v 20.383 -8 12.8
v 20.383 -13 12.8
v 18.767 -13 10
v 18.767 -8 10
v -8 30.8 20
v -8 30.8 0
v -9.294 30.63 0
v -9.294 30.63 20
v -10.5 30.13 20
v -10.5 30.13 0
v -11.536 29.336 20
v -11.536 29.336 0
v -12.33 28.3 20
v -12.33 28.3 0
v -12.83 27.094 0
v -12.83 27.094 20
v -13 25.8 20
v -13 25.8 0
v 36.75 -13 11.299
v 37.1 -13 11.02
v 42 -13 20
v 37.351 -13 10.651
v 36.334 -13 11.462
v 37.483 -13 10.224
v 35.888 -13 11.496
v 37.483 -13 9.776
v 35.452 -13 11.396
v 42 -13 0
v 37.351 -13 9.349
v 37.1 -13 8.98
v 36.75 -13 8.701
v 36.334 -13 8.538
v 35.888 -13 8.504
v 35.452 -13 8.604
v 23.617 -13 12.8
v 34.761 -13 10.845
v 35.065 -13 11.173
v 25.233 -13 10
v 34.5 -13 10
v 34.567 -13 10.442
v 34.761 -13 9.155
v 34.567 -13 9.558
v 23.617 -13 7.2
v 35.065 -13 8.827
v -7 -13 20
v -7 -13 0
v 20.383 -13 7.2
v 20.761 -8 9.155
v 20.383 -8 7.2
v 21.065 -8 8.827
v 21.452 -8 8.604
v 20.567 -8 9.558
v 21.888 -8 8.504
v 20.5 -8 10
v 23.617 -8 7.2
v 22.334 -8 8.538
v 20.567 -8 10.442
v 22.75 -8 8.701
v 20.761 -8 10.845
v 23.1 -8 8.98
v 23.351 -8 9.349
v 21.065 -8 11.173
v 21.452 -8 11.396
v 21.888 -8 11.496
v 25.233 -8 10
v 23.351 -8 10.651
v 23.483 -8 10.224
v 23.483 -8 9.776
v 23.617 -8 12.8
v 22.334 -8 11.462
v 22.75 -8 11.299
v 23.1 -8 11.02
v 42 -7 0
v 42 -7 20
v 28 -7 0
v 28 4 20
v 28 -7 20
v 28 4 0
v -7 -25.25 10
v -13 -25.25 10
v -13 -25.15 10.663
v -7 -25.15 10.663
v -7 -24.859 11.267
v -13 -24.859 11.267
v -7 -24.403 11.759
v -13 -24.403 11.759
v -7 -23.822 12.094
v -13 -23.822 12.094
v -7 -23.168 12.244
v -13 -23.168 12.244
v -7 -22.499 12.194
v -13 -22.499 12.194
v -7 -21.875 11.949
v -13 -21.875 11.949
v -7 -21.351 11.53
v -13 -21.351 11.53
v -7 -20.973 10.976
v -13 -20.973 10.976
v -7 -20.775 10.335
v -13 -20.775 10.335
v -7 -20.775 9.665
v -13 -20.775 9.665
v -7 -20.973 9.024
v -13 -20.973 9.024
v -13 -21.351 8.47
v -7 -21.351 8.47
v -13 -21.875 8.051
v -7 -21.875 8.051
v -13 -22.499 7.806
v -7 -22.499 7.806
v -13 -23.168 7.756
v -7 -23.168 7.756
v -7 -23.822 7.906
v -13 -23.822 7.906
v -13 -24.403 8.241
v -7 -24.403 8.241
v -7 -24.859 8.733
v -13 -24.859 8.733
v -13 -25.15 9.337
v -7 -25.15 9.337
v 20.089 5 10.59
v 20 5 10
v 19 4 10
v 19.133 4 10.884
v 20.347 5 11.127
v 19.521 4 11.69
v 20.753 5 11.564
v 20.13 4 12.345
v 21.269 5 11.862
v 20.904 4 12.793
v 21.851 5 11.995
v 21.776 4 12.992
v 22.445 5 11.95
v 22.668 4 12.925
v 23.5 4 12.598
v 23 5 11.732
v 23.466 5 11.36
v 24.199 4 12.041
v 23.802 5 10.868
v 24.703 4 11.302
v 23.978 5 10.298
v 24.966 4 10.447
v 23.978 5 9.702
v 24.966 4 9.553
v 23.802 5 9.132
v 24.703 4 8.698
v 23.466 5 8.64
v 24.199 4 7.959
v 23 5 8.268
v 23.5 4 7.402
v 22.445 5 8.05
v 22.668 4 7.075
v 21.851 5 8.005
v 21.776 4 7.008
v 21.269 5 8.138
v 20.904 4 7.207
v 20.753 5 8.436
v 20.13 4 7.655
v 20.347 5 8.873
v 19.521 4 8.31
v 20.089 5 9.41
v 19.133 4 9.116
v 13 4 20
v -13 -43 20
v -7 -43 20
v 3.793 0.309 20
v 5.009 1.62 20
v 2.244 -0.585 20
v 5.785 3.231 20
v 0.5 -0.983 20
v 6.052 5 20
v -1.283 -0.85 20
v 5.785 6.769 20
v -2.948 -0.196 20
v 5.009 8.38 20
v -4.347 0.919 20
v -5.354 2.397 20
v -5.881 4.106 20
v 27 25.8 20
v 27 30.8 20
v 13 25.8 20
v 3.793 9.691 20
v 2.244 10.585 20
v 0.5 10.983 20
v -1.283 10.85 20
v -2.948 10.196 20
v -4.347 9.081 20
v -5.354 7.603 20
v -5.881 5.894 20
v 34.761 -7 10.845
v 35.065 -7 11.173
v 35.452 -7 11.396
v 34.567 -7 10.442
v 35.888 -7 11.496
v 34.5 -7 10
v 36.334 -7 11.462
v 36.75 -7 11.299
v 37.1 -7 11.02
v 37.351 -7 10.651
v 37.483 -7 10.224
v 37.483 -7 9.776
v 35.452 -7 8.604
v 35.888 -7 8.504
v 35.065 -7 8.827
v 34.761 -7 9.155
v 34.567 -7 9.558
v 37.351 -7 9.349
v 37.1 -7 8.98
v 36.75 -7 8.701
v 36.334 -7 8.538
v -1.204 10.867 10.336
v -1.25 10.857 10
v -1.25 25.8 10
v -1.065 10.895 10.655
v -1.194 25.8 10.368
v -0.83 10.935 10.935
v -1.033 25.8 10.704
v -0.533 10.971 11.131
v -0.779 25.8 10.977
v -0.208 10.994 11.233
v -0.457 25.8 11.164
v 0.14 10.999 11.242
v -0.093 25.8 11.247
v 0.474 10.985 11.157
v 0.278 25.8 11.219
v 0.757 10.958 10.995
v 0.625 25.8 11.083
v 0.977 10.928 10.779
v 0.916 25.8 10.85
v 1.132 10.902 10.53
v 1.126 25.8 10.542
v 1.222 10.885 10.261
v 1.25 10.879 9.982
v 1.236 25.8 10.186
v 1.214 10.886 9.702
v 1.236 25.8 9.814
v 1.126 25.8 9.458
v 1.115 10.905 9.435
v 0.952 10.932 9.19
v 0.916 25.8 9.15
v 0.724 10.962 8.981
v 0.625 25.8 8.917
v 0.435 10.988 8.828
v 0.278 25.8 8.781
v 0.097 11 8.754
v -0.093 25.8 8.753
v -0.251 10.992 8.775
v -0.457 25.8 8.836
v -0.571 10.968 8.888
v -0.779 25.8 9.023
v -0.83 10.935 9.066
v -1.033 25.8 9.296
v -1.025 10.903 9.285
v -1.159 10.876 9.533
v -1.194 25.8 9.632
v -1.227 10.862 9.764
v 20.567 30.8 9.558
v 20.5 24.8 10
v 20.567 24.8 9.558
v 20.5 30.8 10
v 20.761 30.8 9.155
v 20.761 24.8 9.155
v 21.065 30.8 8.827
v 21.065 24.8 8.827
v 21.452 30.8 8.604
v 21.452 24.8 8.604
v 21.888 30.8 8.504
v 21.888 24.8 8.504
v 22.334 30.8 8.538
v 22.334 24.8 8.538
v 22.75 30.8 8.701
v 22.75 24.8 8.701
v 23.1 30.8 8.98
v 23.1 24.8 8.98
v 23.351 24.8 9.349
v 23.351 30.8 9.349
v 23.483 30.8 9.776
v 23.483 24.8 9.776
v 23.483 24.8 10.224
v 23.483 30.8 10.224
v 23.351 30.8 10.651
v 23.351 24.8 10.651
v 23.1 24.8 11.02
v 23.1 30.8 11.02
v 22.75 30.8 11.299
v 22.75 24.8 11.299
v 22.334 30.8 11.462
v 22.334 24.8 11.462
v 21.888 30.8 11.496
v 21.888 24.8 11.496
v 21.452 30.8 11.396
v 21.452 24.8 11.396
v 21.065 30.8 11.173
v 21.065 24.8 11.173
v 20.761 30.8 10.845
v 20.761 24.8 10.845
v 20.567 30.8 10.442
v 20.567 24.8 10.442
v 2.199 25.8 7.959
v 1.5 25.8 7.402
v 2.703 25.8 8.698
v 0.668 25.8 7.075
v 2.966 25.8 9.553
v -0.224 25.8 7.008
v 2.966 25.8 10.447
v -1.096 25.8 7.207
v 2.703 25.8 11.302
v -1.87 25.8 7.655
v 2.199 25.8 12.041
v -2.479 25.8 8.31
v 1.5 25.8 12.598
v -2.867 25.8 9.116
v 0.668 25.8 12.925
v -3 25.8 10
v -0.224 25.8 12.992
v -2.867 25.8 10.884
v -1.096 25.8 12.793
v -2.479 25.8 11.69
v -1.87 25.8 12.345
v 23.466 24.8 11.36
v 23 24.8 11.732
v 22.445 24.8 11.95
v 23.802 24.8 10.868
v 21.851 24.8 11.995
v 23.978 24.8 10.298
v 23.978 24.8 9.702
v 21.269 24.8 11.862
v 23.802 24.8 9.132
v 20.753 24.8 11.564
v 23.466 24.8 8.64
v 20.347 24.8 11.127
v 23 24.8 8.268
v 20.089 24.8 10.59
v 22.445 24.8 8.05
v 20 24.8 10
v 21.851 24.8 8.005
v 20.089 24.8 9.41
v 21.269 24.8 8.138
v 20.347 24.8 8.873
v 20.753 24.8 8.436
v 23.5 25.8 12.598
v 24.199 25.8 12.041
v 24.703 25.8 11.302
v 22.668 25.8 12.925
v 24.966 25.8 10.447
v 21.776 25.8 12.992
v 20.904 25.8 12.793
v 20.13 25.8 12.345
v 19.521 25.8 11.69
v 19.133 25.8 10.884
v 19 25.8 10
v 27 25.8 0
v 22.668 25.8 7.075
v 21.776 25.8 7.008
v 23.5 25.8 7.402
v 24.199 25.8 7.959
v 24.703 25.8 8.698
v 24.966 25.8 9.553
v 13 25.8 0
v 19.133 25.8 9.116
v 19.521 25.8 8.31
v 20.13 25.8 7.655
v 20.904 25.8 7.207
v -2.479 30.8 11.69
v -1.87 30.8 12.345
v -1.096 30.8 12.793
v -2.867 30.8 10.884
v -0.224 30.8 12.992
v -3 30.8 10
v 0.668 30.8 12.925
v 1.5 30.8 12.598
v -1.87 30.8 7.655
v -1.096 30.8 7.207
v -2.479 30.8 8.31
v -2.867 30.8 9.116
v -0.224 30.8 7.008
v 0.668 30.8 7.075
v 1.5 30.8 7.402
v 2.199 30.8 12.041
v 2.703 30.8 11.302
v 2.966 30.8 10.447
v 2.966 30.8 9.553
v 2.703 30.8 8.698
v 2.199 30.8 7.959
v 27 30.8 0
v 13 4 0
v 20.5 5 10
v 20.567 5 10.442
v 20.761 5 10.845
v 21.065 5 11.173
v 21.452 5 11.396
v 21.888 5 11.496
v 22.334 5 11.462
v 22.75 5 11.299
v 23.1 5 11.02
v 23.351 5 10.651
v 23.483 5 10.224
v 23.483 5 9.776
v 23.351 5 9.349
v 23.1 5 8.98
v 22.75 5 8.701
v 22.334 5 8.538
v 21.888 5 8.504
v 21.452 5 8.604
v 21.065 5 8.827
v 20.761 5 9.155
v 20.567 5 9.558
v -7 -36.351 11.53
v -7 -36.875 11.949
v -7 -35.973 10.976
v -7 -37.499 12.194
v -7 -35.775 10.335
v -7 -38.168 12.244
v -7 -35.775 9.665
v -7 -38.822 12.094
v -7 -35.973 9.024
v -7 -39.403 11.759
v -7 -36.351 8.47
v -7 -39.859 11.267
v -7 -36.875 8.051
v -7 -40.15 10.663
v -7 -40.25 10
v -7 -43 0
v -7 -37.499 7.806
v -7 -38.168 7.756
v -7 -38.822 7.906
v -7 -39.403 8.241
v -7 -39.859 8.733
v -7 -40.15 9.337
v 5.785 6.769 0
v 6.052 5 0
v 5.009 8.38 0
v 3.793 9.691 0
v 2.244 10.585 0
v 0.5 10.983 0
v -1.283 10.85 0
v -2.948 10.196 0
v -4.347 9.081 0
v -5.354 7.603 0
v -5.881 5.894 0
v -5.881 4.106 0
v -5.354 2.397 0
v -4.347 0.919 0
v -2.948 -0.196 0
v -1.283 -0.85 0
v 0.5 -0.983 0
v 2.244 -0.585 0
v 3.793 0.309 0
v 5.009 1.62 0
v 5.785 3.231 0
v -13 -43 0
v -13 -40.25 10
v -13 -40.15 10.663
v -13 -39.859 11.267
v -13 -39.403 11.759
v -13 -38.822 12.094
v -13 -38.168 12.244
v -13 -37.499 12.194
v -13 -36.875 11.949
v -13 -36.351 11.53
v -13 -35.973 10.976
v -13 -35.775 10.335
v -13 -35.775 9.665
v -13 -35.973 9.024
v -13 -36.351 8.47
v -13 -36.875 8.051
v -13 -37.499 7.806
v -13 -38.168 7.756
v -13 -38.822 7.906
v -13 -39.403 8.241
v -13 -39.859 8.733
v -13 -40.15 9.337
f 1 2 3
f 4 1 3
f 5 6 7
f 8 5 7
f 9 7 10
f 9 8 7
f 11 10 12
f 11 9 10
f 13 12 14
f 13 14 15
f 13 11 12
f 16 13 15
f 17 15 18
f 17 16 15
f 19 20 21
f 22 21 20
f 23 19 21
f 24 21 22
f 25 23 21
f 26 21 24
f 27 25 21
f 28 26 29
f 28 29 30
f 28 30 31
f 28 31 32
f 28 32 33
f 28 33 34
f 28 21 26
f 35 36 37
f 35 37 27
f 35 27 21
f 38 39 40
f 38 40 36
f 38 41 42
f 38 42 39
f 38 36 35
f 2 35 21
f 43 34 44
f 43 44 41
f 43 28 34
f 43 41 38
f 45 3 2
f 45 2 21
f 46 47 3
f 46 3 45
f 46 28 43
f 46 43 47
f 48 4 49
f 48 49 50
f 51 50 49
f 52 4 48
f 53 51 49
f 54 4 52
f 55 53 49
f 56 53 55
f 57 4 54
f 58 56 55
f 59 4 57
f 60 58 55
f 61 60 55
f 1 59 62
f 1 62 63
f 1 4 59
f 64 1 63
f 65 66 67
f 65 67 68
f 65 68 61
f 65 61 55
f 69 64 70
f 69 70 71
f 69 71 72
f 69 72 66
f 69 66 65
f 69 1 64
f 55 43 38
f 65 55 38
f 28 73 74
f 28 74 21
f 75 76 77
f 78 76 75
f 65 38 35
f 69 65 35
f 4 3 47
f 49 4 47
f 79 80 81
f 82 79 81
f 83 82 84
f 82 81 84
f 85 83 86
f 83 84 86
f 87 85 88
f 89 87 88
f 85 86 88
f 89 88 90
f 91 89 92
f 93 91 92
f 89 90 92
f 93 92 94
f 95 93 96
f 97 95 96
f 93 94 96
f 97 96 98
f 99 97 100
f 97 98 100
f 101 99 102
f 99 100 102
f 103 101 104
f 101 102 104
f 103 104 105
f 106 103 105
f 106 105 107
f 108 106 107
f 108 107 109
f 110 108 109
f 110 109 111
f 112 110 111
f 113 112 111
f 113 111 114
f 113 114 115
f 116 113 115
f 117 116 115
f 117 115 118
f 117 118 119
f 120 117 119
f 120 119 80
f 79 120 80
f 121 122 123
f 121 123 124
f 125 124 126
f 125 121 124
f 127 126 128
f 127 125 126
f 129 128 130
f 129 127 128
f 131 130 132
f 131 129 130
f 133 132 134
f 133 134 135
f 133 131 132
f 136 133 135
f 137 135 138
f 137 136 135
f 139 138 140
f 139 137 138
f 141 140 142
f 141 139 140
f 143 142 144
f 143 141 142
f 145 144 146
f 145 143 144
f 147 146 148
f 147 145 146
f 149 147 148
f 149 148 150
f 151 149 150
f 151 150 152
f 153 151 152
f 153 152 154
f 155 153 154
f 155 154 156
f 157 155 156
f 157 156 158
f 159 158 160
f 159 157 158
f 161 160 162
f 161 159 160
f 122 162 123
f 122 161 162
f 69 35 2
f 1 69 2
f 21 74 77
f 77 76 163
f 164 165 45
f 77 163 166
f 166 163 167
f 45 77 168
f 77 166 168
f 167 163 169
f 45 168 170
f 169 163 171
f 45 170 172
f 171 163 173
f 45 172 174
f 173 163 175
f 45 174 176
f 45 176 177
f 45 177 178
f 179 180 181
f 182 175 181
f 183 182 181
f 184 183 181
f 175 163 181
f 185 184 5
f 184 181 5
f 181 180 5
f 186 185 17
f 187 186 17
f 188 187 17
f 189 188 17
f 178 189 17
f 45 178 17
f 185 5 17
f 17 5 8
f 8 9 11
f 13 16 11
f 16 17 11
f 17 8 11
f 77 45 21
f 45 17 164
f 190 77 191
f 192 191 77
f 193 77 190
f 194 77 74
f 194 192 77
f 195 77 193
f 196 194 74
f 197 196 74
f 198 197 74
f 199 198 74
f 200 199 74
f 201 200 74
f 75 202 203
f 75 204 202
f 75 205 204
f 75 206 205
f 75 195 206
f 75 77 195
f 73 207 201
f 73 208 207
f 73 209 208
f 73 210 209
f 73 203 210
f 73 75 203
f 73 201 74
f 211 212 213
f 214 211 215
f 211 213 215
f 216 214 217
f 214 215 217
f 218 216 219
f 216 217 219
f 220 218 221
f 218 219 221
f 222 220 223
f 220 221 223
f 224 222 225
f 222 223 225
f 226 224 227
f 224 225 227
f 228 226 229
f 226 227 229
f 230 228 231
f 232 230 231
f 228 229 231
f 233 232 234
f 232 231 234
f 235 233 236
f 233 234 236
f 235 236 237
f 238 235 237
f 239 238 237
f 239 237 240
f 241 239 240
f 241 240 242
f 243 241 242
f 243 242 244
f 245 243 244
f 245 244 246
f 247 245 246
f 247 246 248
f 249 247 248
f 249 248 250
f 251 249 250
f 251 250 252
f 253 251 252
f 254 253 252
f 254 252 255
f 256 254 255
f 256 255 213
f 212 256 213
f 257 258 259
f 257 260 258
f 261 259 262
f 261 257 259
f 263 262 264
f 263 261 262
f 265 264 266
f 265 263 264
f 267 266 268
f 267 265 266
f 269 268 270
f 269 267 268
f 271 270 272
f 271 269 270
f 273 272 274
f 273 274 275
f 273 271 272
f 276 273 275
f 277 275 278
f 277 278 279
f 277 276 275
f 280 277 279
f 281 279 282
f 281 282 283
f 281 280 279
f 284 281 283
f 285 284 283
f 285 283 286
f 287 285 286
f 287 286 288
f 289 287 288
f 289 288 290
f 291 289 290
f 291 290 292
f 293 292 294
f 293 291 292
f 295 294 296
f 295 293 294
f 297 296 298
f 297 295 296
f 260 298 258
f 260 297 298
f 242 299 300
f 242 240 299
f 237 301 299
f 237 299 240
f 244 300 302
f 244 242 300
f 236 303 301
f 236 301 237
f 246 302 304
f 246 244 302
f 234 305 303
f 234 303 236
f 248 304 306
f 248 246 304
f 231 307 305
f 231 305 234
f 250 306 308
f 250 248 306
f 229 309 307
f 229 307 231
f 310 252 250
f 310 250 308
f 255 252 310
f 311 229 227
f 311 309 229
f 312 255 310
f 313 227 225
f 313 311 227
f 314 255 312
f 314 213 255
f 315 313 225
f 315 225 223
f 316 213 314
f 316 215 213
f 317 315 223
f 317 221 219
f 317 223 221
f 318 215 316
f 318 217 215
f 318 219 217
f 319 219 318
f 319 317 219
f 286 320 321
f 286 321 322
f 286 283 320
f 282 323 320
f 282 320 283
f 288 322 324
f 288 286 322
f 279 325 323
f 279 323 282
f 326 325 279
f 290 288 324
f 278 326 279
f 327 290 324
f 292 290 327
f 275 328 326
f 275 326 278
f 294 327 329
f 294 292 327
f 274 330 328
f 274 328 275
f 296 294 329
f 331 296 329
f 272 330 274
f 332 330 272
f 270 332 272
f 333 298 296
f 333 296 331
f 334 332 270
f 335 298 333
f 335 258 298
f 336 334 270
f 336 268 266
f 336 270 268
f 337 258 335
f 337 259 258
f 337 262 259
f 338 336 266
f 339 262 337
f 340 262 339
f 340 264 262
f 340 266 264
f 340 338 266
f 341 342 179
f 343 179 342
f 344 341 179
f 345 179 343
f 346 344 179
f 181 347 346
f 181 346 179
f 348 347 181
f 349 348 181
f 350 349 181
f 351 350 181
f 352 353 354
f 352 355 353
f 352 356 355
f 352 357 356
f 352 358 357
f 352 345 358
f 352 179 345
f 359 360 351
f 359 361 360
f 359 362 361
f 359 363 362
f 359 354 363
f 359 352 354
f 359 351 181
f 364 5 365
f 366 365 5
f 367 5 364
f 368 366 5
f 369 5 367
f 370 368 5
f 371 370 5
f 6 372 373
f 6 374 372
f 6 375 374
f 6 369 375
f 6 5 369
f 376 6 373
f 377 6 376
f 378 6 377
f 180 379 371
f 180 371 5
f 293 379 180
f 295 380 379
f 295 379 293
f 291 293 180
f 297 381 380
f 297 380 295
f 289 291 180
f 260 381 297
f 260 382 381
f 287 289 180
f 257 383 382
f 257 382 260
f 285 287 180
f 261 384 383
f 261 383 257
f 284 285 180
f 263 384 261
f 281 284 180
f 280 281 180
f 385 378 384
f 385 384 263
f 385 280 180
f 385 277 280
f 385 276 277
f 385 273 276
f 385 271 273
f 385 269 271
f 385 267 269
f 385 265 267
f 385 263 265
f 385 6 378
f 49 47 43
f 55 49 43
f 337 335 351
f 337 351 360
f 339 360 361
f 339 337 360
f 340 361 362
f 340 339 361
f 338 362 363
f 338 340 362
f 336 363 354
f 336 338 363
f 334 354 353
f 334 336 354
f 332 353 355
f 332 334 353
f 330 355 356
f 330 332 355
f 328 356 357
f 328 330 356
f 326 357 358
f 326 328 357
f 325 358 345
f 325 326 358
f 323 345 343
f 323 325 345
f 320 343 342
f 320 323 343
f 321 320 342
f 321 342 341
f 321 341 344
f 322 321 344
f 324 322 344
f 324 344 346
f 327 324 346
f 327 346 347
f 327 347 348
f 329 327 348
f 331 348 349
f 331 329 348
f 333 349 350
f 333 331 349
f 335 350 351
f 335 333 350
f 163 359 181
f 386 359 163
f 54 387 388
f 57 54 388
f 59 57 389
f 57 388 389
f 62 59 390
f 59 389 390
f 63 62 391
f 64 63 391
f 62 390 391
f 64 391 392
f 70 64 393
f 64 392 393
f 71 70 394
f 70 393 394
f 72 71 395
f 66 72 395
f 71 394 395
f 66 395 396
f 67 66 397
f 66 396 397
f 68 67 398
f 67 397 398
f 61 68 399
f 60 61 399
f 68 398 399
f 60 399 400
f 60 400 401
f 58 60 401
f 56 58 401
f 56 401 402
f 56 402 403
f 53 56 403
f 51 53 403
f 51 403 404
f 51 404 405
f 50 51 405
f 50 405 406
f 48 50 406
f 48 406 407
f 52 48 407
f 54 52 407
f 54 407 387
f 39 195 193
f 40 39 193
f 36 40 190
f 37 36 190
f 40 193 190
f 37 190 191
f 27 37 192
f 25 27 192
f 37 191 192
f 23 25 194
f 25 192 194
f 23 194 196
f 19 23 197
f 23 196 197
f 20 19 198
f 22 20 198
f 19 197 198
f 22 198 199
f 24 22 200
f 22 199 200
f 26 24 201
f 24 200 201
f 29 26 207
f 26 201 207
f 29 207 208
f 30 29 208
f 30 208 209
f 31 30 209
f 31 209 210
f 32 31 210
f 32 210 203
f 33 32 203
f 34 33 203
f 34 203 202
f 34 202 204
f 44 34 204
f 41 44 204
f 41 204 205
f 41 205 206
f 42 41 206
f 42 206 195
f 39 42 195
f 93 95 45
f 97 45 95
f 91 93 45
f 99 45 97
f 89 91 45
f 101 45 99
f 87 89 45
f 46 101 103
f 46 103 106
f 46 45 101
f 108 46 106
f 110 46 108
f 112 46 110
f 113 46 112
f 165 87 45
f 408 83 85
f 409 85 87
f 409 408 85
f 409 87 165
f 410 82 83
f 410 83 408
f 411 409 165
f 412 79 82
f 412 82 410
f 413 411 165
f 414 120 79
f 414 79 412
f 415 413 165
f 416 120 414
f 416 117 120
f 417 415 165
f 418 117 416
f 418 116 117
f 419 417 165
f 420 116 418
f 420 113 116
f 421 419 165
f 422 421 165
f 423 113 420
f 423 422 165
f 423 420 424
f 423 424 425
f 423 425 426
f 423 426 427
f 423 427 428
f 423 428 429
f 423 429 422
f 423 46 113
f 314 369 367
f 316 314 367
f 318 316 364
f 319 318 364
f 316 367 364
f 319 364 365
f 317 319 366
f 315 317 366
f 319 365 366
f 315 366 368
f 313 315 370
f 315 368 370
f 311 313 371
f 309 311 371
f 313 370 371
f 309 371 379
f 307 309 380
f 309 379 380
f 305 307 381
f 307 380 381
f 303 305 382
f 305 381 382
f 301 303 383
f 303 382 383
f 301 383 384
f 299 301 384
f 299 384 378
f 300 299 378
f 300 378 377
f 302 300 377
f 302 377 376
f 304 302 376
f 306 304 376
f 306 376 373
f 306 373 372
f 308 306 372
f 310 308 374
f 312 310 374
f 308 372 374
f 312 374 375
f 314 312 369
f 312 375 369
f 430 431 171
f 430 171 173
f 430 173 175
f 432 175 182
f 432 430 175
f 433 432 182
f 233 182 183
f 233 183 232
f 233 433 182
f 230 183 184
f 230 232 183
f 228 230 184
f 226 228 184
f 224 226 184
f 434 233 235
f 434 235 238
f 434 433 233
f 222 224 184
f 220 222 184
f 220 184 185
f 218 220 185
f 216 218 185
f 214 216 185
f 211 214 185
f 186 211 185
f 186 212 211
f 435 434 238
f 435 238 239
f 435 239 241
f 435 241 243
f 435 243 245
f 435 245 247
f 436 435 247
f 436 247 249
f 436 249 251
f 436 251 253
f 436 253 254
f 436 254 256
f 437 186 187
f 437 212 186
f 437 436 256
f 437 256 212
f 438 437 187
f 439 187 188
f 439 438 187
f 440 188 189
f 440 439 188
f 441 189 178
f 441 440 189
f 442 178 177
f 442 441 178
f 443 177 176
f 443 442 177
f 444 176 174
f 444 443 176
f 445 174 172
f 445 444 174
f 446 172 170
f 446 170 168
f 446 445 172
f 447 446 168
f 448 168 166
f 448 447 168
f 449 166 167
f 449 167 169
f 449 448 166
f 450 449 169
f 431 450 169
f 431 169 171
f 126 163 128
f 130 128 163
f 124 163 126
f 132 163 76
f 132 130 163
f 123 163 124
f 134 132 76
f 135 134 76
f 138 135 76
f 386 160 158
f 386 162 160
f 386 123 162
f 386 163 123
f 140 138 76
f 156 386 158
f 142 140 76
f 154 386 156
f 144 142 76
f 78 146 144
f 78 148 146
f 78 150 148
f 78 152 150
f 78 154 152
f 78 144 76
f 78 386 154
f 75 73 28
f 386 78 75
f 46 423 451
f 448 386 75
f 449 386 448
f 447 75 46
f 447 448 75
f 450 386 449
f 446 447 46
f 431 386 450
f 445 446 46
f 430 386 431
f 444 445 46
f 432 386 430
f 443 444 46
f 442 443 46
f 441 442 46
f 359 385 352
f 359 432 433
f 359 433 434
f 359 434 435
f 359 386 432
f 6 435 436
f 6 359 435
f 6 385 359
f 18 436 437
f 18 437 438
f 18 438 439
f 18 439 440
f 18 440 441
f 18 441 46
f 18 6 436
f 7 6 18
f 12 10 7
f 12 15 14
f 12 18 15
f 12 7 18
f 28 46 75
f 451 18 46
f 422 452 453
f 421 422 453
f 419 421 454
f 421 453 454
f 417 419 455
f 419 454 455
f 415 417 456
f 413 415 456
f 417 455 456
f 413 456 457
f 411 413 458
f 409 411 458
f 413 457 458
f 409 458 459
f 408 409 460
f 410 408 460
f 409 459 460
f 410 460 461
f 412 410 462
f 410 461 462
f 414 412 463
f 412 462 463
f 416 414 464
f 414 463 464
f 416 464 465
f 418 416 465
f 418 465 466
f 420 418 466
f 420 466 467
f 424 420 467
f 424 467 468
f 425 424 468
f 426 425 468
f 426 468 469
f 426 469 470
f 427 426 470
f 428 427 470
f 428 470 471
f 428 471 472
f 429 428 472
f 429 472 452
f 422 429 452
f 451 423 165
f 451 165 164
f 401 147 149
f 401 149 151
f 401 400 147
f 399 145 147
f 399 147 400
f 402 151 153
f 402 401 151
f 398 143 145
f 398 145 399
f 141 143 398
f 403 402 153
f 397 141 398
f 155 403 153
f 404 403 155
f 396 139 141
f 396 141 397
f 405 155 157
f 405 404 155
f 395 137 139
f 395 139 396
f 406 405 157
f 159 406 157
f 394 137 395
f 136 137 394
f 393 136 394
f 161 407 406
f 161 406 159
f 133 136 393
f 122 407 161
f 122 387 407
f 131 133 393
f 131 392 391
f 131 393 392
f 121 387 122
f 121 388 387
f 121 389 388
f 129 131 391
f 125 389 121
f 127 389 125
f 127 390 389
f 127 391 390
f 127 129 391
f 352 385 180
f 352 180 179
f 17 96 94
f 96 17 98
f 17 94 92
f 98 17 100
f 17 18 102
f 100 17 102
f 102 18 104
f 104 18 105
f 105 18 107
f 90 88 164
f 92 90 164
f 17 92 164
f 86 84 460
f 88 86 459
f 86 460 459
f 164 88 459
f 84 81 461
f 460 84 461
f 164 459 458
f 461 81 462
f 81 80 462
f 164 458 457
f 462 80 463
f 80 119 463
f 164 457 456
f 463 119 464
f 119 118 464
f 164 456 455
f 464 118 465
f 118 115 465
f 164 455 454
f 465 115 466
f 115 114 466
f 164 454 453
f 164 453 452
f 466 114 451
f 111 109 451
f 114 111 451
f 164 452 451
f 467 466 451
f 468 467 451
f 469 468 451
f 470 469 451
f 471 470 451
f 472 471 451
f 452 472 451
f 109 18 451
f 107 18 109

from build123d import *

# Parameters (mm, degrees)
SKETCH1_R               = 6
BOSS_EXTRUDE1_DEPTH     = 20
SKETCH2_R               = 2.25
CUT_EXTRUDE1_DEPTH      = 20
SKETCH4_R               = 1.5
CUT_EXTRUDE2_DEPTH      = 45
BOSS_EXTRUDE2_START     = 11
SKETCH5_W               = 15.288681569
SKETCH5_H               = 20
SKETCH5_R               = 1.5
BOSS_EXTRUDE2_DEPTH     = 11
CUT_EXTRUDE3_REACH      = 89.238
CUT_EXTRUDE3_END_RADIUS = 6
SKETCH6_R               = 1.25
SKETCH7_R               = 3
CUT_EXTRUDE4_DEPTH      = 5
CUT_EXTRUDE5_DEPTH      = 5
FILLET1_R               = 5
BOSS_EXTRUDE3_START     = 1
SKETCH10_R              = 3
SKETCH10_R_2            = 1.5
BOSS_EXTRUDE3_DEPTH     = 1
CHAMFER1_SIZE           = 1
SKETCH11_R              = 3
SKETCH11_R_2            = 1.5
BOSS_EXTRUDE4_DEPTH     = 1
CHAMFER2_SIZE           = 1


with BuildPart() as part:
    # Sketch1 → Boss-Extrude1 (new body)
    with BuildSketch(Plane.XY):
        Polygon((27, 30.8), (27, 25.8), (13, 25.8), (13, -7), (42, -7), (42, -13), (-7, -13), (-7, -43), (-13, -43), (-13, -8.291544952), (-13, 30.8), align=None)
        with Locations((0.051684878, 5)):
            Circle(SKETCH1_R, mode=Mode.SUBTRACT)
    extrude(amount=BOSS_EXTRUDE1_DEPTH)

    # Sketch2 → Cut-Extrude1 (cut)
    with BuildSketch(Plane.ZY.offset(13)):
        with Locations(Location((10, -38, 0), (0, 0, 270))):
            Circle(SKETCH2_R)
        with Locations(Location((10, -23, 0), (0, 0, 270))):
            Circle(SKETCH2_R)
    extrude(amount=-CUT_EXTRUDE1_DEPTH, mode=Mode.SUBTRACT)

    # Sketch4 → Cut-Extrude2 (cut)
    with BuildSketch(Plane(origin=(0, 30.8, 0), x_dir=(1, 0, 0), z_dir=(0, 1, 0))):
        with Locations(Location((22, -10, 0), (0, 0, 180))):
            Circle(SKETCH4_R)
        with Locations(Location((36, -10, 0), (0, 0, 180))):
            Circle(SKETCH4_R)
    extrude(amount=-CUT_EXTRUDE2_DEPTH, mode=Mode.SUBTRACT)

    # Sketch5 → Boss-Extrude2 (add)
    with BuildSketch(Plane(origin=(0, -7, 0), x_dir=(1, 0, 0), z_dir=(0, 1, 0)).offset(BOSS_EXTRUDE2_START)):
        with Locations((20.355659216, -10)):
            Rectangle(SKETCH5_W, SKETCH5_H)
        with Locations(Location((22, -10, 0), (0, 0, 180))):
            Circle(SKETCH5_R, mode=Mode.SUBTRACT)
    extrude(amount=-BOSS_EXTRUDE2_DEPTH)

    # Cut-Extrude3: up to this cylinder (the profile starts outside it)
    cut_extrude3_end = Plane(origin=(0.051684878, 5, 10), z_dir=(0, 0, -1)) * Cylinder(CUT_EXTRUDE3_END_RADIUS, 191.476, mode=Mode.PRIVATE)
    # Sketch6 → Cut-Extrude3 (cut, up to the surface)
    with BuildSketch(Plane(origin=(0, 30.8, 0), x_dir=(1, 0, 0), z_dir=(0, 1, 0)), mode=Mode.PRIVATE) as cut_extrude3_sk1:
        with Locations(Location((0, -10, 0), (0, 0, 180))):
            Circle(SKETCH6_R)
    cut_extrude3_tool1 = extrude(cut_extrude3_sk1.sketch, amount=-CUT_EXTRUDE3_REACH, mode=Mode.PRIVATE) - cut_extrude3_end
    add(cut_extrude3_tool1.solids().sort_by_distance((0, 30.8, 10))[0], mode=Mode.SUBTRACT)

    # Sketch7 → Cut-Extrude4 (cut)
    with BuildSketch(Plane(origin=(0, 30.8, 0), x_dir=(1, 0, 0), z_dir=(0, 1, 0))):
        with Locations(Location((0, -10, 0), (0, 0, 180))):
            Circle(SKETCH7_R)
    extrude(amount=-CUT_EXTRUDE4_DEPTH, mode=Mode.SUBTRACT)

    # Sketch9 → Cut-Extrude5 (cut)
    with BuildSketch(Plane.XZ.offset(13)):
        Polygon((25.233161507, 10), (23.616580754, 12.8), (20.383419246, 12.8), (18.766838493, 10), (20.383419246, 7.2), (23.616580754, 7.2), align=None)
    extrude(amount=-CUT_EXTRUDE5_DEPTH, mode=Mode.SUBTRACT)

    # Fillet1
    fillet1_edges = [part.edges().sort_by_distance(p)[0] for p in [
        (-13, 30.8, 10),
    ]]
    fillet(fillet1_edges, radius=FILLET1_R)

    # Sketch10 → Boss-Extrude3 (add)
    with BuildSketch(Plane(origin=(0, 4, 0), x_dir=(1, 0, 0), z_dir=(0, 1, 0)).offset(BOSS_EXTRUDE3_START)):
        with Locations(Location((22, -10, 0), (0, 0, 180))):
            Circle(SKETCH10_R)
        with Locations(Location((22, -10, 0), (0, 0, 180))):
            Circle(SKETCH10_R_2, mode=Mode.SUBTRACT)
    extrude(amount=-BOSS_EXTRUDE3_DEPTH)

    # Chamfer1
    chamfer1_edges = [part.edges().sort_by_distance(p)[0] for p in [
        (25, 5, 10),
    ]]
    chamfer(chamfer1_edges, length=CHAMFER1_SIZE - 0.0001)  # a hair under: the kernel refuses the full size

    # Sketch11 → Boss-Extrude4 (add)
    with BuildSketch(Plane.XZ.offset(-25.8)):
        with Locations(Location((22, 10, 0), (0, 0, 180))):
            Circle(SKETCH11_R)
        with Locations(Location((22, 10, 0), (0, 0, 180))):
            Circle(SKETCH11_R_2, mode=Mode.SUBTRACT)
    extrude(amount=BOSS_EXTRUDE4_DEPTH)

    # Chamfer2
    chamfer2_edges = [part.edges().sort_by_distance(p)[0] for p in [
        (25, 24.8, 10),
    ]]
    chamfer(chamfer2_edges, length=CHAMFER2_SIZE - 0.0001)  # a hair under: the kernel refuses the full size


solid = part.part
